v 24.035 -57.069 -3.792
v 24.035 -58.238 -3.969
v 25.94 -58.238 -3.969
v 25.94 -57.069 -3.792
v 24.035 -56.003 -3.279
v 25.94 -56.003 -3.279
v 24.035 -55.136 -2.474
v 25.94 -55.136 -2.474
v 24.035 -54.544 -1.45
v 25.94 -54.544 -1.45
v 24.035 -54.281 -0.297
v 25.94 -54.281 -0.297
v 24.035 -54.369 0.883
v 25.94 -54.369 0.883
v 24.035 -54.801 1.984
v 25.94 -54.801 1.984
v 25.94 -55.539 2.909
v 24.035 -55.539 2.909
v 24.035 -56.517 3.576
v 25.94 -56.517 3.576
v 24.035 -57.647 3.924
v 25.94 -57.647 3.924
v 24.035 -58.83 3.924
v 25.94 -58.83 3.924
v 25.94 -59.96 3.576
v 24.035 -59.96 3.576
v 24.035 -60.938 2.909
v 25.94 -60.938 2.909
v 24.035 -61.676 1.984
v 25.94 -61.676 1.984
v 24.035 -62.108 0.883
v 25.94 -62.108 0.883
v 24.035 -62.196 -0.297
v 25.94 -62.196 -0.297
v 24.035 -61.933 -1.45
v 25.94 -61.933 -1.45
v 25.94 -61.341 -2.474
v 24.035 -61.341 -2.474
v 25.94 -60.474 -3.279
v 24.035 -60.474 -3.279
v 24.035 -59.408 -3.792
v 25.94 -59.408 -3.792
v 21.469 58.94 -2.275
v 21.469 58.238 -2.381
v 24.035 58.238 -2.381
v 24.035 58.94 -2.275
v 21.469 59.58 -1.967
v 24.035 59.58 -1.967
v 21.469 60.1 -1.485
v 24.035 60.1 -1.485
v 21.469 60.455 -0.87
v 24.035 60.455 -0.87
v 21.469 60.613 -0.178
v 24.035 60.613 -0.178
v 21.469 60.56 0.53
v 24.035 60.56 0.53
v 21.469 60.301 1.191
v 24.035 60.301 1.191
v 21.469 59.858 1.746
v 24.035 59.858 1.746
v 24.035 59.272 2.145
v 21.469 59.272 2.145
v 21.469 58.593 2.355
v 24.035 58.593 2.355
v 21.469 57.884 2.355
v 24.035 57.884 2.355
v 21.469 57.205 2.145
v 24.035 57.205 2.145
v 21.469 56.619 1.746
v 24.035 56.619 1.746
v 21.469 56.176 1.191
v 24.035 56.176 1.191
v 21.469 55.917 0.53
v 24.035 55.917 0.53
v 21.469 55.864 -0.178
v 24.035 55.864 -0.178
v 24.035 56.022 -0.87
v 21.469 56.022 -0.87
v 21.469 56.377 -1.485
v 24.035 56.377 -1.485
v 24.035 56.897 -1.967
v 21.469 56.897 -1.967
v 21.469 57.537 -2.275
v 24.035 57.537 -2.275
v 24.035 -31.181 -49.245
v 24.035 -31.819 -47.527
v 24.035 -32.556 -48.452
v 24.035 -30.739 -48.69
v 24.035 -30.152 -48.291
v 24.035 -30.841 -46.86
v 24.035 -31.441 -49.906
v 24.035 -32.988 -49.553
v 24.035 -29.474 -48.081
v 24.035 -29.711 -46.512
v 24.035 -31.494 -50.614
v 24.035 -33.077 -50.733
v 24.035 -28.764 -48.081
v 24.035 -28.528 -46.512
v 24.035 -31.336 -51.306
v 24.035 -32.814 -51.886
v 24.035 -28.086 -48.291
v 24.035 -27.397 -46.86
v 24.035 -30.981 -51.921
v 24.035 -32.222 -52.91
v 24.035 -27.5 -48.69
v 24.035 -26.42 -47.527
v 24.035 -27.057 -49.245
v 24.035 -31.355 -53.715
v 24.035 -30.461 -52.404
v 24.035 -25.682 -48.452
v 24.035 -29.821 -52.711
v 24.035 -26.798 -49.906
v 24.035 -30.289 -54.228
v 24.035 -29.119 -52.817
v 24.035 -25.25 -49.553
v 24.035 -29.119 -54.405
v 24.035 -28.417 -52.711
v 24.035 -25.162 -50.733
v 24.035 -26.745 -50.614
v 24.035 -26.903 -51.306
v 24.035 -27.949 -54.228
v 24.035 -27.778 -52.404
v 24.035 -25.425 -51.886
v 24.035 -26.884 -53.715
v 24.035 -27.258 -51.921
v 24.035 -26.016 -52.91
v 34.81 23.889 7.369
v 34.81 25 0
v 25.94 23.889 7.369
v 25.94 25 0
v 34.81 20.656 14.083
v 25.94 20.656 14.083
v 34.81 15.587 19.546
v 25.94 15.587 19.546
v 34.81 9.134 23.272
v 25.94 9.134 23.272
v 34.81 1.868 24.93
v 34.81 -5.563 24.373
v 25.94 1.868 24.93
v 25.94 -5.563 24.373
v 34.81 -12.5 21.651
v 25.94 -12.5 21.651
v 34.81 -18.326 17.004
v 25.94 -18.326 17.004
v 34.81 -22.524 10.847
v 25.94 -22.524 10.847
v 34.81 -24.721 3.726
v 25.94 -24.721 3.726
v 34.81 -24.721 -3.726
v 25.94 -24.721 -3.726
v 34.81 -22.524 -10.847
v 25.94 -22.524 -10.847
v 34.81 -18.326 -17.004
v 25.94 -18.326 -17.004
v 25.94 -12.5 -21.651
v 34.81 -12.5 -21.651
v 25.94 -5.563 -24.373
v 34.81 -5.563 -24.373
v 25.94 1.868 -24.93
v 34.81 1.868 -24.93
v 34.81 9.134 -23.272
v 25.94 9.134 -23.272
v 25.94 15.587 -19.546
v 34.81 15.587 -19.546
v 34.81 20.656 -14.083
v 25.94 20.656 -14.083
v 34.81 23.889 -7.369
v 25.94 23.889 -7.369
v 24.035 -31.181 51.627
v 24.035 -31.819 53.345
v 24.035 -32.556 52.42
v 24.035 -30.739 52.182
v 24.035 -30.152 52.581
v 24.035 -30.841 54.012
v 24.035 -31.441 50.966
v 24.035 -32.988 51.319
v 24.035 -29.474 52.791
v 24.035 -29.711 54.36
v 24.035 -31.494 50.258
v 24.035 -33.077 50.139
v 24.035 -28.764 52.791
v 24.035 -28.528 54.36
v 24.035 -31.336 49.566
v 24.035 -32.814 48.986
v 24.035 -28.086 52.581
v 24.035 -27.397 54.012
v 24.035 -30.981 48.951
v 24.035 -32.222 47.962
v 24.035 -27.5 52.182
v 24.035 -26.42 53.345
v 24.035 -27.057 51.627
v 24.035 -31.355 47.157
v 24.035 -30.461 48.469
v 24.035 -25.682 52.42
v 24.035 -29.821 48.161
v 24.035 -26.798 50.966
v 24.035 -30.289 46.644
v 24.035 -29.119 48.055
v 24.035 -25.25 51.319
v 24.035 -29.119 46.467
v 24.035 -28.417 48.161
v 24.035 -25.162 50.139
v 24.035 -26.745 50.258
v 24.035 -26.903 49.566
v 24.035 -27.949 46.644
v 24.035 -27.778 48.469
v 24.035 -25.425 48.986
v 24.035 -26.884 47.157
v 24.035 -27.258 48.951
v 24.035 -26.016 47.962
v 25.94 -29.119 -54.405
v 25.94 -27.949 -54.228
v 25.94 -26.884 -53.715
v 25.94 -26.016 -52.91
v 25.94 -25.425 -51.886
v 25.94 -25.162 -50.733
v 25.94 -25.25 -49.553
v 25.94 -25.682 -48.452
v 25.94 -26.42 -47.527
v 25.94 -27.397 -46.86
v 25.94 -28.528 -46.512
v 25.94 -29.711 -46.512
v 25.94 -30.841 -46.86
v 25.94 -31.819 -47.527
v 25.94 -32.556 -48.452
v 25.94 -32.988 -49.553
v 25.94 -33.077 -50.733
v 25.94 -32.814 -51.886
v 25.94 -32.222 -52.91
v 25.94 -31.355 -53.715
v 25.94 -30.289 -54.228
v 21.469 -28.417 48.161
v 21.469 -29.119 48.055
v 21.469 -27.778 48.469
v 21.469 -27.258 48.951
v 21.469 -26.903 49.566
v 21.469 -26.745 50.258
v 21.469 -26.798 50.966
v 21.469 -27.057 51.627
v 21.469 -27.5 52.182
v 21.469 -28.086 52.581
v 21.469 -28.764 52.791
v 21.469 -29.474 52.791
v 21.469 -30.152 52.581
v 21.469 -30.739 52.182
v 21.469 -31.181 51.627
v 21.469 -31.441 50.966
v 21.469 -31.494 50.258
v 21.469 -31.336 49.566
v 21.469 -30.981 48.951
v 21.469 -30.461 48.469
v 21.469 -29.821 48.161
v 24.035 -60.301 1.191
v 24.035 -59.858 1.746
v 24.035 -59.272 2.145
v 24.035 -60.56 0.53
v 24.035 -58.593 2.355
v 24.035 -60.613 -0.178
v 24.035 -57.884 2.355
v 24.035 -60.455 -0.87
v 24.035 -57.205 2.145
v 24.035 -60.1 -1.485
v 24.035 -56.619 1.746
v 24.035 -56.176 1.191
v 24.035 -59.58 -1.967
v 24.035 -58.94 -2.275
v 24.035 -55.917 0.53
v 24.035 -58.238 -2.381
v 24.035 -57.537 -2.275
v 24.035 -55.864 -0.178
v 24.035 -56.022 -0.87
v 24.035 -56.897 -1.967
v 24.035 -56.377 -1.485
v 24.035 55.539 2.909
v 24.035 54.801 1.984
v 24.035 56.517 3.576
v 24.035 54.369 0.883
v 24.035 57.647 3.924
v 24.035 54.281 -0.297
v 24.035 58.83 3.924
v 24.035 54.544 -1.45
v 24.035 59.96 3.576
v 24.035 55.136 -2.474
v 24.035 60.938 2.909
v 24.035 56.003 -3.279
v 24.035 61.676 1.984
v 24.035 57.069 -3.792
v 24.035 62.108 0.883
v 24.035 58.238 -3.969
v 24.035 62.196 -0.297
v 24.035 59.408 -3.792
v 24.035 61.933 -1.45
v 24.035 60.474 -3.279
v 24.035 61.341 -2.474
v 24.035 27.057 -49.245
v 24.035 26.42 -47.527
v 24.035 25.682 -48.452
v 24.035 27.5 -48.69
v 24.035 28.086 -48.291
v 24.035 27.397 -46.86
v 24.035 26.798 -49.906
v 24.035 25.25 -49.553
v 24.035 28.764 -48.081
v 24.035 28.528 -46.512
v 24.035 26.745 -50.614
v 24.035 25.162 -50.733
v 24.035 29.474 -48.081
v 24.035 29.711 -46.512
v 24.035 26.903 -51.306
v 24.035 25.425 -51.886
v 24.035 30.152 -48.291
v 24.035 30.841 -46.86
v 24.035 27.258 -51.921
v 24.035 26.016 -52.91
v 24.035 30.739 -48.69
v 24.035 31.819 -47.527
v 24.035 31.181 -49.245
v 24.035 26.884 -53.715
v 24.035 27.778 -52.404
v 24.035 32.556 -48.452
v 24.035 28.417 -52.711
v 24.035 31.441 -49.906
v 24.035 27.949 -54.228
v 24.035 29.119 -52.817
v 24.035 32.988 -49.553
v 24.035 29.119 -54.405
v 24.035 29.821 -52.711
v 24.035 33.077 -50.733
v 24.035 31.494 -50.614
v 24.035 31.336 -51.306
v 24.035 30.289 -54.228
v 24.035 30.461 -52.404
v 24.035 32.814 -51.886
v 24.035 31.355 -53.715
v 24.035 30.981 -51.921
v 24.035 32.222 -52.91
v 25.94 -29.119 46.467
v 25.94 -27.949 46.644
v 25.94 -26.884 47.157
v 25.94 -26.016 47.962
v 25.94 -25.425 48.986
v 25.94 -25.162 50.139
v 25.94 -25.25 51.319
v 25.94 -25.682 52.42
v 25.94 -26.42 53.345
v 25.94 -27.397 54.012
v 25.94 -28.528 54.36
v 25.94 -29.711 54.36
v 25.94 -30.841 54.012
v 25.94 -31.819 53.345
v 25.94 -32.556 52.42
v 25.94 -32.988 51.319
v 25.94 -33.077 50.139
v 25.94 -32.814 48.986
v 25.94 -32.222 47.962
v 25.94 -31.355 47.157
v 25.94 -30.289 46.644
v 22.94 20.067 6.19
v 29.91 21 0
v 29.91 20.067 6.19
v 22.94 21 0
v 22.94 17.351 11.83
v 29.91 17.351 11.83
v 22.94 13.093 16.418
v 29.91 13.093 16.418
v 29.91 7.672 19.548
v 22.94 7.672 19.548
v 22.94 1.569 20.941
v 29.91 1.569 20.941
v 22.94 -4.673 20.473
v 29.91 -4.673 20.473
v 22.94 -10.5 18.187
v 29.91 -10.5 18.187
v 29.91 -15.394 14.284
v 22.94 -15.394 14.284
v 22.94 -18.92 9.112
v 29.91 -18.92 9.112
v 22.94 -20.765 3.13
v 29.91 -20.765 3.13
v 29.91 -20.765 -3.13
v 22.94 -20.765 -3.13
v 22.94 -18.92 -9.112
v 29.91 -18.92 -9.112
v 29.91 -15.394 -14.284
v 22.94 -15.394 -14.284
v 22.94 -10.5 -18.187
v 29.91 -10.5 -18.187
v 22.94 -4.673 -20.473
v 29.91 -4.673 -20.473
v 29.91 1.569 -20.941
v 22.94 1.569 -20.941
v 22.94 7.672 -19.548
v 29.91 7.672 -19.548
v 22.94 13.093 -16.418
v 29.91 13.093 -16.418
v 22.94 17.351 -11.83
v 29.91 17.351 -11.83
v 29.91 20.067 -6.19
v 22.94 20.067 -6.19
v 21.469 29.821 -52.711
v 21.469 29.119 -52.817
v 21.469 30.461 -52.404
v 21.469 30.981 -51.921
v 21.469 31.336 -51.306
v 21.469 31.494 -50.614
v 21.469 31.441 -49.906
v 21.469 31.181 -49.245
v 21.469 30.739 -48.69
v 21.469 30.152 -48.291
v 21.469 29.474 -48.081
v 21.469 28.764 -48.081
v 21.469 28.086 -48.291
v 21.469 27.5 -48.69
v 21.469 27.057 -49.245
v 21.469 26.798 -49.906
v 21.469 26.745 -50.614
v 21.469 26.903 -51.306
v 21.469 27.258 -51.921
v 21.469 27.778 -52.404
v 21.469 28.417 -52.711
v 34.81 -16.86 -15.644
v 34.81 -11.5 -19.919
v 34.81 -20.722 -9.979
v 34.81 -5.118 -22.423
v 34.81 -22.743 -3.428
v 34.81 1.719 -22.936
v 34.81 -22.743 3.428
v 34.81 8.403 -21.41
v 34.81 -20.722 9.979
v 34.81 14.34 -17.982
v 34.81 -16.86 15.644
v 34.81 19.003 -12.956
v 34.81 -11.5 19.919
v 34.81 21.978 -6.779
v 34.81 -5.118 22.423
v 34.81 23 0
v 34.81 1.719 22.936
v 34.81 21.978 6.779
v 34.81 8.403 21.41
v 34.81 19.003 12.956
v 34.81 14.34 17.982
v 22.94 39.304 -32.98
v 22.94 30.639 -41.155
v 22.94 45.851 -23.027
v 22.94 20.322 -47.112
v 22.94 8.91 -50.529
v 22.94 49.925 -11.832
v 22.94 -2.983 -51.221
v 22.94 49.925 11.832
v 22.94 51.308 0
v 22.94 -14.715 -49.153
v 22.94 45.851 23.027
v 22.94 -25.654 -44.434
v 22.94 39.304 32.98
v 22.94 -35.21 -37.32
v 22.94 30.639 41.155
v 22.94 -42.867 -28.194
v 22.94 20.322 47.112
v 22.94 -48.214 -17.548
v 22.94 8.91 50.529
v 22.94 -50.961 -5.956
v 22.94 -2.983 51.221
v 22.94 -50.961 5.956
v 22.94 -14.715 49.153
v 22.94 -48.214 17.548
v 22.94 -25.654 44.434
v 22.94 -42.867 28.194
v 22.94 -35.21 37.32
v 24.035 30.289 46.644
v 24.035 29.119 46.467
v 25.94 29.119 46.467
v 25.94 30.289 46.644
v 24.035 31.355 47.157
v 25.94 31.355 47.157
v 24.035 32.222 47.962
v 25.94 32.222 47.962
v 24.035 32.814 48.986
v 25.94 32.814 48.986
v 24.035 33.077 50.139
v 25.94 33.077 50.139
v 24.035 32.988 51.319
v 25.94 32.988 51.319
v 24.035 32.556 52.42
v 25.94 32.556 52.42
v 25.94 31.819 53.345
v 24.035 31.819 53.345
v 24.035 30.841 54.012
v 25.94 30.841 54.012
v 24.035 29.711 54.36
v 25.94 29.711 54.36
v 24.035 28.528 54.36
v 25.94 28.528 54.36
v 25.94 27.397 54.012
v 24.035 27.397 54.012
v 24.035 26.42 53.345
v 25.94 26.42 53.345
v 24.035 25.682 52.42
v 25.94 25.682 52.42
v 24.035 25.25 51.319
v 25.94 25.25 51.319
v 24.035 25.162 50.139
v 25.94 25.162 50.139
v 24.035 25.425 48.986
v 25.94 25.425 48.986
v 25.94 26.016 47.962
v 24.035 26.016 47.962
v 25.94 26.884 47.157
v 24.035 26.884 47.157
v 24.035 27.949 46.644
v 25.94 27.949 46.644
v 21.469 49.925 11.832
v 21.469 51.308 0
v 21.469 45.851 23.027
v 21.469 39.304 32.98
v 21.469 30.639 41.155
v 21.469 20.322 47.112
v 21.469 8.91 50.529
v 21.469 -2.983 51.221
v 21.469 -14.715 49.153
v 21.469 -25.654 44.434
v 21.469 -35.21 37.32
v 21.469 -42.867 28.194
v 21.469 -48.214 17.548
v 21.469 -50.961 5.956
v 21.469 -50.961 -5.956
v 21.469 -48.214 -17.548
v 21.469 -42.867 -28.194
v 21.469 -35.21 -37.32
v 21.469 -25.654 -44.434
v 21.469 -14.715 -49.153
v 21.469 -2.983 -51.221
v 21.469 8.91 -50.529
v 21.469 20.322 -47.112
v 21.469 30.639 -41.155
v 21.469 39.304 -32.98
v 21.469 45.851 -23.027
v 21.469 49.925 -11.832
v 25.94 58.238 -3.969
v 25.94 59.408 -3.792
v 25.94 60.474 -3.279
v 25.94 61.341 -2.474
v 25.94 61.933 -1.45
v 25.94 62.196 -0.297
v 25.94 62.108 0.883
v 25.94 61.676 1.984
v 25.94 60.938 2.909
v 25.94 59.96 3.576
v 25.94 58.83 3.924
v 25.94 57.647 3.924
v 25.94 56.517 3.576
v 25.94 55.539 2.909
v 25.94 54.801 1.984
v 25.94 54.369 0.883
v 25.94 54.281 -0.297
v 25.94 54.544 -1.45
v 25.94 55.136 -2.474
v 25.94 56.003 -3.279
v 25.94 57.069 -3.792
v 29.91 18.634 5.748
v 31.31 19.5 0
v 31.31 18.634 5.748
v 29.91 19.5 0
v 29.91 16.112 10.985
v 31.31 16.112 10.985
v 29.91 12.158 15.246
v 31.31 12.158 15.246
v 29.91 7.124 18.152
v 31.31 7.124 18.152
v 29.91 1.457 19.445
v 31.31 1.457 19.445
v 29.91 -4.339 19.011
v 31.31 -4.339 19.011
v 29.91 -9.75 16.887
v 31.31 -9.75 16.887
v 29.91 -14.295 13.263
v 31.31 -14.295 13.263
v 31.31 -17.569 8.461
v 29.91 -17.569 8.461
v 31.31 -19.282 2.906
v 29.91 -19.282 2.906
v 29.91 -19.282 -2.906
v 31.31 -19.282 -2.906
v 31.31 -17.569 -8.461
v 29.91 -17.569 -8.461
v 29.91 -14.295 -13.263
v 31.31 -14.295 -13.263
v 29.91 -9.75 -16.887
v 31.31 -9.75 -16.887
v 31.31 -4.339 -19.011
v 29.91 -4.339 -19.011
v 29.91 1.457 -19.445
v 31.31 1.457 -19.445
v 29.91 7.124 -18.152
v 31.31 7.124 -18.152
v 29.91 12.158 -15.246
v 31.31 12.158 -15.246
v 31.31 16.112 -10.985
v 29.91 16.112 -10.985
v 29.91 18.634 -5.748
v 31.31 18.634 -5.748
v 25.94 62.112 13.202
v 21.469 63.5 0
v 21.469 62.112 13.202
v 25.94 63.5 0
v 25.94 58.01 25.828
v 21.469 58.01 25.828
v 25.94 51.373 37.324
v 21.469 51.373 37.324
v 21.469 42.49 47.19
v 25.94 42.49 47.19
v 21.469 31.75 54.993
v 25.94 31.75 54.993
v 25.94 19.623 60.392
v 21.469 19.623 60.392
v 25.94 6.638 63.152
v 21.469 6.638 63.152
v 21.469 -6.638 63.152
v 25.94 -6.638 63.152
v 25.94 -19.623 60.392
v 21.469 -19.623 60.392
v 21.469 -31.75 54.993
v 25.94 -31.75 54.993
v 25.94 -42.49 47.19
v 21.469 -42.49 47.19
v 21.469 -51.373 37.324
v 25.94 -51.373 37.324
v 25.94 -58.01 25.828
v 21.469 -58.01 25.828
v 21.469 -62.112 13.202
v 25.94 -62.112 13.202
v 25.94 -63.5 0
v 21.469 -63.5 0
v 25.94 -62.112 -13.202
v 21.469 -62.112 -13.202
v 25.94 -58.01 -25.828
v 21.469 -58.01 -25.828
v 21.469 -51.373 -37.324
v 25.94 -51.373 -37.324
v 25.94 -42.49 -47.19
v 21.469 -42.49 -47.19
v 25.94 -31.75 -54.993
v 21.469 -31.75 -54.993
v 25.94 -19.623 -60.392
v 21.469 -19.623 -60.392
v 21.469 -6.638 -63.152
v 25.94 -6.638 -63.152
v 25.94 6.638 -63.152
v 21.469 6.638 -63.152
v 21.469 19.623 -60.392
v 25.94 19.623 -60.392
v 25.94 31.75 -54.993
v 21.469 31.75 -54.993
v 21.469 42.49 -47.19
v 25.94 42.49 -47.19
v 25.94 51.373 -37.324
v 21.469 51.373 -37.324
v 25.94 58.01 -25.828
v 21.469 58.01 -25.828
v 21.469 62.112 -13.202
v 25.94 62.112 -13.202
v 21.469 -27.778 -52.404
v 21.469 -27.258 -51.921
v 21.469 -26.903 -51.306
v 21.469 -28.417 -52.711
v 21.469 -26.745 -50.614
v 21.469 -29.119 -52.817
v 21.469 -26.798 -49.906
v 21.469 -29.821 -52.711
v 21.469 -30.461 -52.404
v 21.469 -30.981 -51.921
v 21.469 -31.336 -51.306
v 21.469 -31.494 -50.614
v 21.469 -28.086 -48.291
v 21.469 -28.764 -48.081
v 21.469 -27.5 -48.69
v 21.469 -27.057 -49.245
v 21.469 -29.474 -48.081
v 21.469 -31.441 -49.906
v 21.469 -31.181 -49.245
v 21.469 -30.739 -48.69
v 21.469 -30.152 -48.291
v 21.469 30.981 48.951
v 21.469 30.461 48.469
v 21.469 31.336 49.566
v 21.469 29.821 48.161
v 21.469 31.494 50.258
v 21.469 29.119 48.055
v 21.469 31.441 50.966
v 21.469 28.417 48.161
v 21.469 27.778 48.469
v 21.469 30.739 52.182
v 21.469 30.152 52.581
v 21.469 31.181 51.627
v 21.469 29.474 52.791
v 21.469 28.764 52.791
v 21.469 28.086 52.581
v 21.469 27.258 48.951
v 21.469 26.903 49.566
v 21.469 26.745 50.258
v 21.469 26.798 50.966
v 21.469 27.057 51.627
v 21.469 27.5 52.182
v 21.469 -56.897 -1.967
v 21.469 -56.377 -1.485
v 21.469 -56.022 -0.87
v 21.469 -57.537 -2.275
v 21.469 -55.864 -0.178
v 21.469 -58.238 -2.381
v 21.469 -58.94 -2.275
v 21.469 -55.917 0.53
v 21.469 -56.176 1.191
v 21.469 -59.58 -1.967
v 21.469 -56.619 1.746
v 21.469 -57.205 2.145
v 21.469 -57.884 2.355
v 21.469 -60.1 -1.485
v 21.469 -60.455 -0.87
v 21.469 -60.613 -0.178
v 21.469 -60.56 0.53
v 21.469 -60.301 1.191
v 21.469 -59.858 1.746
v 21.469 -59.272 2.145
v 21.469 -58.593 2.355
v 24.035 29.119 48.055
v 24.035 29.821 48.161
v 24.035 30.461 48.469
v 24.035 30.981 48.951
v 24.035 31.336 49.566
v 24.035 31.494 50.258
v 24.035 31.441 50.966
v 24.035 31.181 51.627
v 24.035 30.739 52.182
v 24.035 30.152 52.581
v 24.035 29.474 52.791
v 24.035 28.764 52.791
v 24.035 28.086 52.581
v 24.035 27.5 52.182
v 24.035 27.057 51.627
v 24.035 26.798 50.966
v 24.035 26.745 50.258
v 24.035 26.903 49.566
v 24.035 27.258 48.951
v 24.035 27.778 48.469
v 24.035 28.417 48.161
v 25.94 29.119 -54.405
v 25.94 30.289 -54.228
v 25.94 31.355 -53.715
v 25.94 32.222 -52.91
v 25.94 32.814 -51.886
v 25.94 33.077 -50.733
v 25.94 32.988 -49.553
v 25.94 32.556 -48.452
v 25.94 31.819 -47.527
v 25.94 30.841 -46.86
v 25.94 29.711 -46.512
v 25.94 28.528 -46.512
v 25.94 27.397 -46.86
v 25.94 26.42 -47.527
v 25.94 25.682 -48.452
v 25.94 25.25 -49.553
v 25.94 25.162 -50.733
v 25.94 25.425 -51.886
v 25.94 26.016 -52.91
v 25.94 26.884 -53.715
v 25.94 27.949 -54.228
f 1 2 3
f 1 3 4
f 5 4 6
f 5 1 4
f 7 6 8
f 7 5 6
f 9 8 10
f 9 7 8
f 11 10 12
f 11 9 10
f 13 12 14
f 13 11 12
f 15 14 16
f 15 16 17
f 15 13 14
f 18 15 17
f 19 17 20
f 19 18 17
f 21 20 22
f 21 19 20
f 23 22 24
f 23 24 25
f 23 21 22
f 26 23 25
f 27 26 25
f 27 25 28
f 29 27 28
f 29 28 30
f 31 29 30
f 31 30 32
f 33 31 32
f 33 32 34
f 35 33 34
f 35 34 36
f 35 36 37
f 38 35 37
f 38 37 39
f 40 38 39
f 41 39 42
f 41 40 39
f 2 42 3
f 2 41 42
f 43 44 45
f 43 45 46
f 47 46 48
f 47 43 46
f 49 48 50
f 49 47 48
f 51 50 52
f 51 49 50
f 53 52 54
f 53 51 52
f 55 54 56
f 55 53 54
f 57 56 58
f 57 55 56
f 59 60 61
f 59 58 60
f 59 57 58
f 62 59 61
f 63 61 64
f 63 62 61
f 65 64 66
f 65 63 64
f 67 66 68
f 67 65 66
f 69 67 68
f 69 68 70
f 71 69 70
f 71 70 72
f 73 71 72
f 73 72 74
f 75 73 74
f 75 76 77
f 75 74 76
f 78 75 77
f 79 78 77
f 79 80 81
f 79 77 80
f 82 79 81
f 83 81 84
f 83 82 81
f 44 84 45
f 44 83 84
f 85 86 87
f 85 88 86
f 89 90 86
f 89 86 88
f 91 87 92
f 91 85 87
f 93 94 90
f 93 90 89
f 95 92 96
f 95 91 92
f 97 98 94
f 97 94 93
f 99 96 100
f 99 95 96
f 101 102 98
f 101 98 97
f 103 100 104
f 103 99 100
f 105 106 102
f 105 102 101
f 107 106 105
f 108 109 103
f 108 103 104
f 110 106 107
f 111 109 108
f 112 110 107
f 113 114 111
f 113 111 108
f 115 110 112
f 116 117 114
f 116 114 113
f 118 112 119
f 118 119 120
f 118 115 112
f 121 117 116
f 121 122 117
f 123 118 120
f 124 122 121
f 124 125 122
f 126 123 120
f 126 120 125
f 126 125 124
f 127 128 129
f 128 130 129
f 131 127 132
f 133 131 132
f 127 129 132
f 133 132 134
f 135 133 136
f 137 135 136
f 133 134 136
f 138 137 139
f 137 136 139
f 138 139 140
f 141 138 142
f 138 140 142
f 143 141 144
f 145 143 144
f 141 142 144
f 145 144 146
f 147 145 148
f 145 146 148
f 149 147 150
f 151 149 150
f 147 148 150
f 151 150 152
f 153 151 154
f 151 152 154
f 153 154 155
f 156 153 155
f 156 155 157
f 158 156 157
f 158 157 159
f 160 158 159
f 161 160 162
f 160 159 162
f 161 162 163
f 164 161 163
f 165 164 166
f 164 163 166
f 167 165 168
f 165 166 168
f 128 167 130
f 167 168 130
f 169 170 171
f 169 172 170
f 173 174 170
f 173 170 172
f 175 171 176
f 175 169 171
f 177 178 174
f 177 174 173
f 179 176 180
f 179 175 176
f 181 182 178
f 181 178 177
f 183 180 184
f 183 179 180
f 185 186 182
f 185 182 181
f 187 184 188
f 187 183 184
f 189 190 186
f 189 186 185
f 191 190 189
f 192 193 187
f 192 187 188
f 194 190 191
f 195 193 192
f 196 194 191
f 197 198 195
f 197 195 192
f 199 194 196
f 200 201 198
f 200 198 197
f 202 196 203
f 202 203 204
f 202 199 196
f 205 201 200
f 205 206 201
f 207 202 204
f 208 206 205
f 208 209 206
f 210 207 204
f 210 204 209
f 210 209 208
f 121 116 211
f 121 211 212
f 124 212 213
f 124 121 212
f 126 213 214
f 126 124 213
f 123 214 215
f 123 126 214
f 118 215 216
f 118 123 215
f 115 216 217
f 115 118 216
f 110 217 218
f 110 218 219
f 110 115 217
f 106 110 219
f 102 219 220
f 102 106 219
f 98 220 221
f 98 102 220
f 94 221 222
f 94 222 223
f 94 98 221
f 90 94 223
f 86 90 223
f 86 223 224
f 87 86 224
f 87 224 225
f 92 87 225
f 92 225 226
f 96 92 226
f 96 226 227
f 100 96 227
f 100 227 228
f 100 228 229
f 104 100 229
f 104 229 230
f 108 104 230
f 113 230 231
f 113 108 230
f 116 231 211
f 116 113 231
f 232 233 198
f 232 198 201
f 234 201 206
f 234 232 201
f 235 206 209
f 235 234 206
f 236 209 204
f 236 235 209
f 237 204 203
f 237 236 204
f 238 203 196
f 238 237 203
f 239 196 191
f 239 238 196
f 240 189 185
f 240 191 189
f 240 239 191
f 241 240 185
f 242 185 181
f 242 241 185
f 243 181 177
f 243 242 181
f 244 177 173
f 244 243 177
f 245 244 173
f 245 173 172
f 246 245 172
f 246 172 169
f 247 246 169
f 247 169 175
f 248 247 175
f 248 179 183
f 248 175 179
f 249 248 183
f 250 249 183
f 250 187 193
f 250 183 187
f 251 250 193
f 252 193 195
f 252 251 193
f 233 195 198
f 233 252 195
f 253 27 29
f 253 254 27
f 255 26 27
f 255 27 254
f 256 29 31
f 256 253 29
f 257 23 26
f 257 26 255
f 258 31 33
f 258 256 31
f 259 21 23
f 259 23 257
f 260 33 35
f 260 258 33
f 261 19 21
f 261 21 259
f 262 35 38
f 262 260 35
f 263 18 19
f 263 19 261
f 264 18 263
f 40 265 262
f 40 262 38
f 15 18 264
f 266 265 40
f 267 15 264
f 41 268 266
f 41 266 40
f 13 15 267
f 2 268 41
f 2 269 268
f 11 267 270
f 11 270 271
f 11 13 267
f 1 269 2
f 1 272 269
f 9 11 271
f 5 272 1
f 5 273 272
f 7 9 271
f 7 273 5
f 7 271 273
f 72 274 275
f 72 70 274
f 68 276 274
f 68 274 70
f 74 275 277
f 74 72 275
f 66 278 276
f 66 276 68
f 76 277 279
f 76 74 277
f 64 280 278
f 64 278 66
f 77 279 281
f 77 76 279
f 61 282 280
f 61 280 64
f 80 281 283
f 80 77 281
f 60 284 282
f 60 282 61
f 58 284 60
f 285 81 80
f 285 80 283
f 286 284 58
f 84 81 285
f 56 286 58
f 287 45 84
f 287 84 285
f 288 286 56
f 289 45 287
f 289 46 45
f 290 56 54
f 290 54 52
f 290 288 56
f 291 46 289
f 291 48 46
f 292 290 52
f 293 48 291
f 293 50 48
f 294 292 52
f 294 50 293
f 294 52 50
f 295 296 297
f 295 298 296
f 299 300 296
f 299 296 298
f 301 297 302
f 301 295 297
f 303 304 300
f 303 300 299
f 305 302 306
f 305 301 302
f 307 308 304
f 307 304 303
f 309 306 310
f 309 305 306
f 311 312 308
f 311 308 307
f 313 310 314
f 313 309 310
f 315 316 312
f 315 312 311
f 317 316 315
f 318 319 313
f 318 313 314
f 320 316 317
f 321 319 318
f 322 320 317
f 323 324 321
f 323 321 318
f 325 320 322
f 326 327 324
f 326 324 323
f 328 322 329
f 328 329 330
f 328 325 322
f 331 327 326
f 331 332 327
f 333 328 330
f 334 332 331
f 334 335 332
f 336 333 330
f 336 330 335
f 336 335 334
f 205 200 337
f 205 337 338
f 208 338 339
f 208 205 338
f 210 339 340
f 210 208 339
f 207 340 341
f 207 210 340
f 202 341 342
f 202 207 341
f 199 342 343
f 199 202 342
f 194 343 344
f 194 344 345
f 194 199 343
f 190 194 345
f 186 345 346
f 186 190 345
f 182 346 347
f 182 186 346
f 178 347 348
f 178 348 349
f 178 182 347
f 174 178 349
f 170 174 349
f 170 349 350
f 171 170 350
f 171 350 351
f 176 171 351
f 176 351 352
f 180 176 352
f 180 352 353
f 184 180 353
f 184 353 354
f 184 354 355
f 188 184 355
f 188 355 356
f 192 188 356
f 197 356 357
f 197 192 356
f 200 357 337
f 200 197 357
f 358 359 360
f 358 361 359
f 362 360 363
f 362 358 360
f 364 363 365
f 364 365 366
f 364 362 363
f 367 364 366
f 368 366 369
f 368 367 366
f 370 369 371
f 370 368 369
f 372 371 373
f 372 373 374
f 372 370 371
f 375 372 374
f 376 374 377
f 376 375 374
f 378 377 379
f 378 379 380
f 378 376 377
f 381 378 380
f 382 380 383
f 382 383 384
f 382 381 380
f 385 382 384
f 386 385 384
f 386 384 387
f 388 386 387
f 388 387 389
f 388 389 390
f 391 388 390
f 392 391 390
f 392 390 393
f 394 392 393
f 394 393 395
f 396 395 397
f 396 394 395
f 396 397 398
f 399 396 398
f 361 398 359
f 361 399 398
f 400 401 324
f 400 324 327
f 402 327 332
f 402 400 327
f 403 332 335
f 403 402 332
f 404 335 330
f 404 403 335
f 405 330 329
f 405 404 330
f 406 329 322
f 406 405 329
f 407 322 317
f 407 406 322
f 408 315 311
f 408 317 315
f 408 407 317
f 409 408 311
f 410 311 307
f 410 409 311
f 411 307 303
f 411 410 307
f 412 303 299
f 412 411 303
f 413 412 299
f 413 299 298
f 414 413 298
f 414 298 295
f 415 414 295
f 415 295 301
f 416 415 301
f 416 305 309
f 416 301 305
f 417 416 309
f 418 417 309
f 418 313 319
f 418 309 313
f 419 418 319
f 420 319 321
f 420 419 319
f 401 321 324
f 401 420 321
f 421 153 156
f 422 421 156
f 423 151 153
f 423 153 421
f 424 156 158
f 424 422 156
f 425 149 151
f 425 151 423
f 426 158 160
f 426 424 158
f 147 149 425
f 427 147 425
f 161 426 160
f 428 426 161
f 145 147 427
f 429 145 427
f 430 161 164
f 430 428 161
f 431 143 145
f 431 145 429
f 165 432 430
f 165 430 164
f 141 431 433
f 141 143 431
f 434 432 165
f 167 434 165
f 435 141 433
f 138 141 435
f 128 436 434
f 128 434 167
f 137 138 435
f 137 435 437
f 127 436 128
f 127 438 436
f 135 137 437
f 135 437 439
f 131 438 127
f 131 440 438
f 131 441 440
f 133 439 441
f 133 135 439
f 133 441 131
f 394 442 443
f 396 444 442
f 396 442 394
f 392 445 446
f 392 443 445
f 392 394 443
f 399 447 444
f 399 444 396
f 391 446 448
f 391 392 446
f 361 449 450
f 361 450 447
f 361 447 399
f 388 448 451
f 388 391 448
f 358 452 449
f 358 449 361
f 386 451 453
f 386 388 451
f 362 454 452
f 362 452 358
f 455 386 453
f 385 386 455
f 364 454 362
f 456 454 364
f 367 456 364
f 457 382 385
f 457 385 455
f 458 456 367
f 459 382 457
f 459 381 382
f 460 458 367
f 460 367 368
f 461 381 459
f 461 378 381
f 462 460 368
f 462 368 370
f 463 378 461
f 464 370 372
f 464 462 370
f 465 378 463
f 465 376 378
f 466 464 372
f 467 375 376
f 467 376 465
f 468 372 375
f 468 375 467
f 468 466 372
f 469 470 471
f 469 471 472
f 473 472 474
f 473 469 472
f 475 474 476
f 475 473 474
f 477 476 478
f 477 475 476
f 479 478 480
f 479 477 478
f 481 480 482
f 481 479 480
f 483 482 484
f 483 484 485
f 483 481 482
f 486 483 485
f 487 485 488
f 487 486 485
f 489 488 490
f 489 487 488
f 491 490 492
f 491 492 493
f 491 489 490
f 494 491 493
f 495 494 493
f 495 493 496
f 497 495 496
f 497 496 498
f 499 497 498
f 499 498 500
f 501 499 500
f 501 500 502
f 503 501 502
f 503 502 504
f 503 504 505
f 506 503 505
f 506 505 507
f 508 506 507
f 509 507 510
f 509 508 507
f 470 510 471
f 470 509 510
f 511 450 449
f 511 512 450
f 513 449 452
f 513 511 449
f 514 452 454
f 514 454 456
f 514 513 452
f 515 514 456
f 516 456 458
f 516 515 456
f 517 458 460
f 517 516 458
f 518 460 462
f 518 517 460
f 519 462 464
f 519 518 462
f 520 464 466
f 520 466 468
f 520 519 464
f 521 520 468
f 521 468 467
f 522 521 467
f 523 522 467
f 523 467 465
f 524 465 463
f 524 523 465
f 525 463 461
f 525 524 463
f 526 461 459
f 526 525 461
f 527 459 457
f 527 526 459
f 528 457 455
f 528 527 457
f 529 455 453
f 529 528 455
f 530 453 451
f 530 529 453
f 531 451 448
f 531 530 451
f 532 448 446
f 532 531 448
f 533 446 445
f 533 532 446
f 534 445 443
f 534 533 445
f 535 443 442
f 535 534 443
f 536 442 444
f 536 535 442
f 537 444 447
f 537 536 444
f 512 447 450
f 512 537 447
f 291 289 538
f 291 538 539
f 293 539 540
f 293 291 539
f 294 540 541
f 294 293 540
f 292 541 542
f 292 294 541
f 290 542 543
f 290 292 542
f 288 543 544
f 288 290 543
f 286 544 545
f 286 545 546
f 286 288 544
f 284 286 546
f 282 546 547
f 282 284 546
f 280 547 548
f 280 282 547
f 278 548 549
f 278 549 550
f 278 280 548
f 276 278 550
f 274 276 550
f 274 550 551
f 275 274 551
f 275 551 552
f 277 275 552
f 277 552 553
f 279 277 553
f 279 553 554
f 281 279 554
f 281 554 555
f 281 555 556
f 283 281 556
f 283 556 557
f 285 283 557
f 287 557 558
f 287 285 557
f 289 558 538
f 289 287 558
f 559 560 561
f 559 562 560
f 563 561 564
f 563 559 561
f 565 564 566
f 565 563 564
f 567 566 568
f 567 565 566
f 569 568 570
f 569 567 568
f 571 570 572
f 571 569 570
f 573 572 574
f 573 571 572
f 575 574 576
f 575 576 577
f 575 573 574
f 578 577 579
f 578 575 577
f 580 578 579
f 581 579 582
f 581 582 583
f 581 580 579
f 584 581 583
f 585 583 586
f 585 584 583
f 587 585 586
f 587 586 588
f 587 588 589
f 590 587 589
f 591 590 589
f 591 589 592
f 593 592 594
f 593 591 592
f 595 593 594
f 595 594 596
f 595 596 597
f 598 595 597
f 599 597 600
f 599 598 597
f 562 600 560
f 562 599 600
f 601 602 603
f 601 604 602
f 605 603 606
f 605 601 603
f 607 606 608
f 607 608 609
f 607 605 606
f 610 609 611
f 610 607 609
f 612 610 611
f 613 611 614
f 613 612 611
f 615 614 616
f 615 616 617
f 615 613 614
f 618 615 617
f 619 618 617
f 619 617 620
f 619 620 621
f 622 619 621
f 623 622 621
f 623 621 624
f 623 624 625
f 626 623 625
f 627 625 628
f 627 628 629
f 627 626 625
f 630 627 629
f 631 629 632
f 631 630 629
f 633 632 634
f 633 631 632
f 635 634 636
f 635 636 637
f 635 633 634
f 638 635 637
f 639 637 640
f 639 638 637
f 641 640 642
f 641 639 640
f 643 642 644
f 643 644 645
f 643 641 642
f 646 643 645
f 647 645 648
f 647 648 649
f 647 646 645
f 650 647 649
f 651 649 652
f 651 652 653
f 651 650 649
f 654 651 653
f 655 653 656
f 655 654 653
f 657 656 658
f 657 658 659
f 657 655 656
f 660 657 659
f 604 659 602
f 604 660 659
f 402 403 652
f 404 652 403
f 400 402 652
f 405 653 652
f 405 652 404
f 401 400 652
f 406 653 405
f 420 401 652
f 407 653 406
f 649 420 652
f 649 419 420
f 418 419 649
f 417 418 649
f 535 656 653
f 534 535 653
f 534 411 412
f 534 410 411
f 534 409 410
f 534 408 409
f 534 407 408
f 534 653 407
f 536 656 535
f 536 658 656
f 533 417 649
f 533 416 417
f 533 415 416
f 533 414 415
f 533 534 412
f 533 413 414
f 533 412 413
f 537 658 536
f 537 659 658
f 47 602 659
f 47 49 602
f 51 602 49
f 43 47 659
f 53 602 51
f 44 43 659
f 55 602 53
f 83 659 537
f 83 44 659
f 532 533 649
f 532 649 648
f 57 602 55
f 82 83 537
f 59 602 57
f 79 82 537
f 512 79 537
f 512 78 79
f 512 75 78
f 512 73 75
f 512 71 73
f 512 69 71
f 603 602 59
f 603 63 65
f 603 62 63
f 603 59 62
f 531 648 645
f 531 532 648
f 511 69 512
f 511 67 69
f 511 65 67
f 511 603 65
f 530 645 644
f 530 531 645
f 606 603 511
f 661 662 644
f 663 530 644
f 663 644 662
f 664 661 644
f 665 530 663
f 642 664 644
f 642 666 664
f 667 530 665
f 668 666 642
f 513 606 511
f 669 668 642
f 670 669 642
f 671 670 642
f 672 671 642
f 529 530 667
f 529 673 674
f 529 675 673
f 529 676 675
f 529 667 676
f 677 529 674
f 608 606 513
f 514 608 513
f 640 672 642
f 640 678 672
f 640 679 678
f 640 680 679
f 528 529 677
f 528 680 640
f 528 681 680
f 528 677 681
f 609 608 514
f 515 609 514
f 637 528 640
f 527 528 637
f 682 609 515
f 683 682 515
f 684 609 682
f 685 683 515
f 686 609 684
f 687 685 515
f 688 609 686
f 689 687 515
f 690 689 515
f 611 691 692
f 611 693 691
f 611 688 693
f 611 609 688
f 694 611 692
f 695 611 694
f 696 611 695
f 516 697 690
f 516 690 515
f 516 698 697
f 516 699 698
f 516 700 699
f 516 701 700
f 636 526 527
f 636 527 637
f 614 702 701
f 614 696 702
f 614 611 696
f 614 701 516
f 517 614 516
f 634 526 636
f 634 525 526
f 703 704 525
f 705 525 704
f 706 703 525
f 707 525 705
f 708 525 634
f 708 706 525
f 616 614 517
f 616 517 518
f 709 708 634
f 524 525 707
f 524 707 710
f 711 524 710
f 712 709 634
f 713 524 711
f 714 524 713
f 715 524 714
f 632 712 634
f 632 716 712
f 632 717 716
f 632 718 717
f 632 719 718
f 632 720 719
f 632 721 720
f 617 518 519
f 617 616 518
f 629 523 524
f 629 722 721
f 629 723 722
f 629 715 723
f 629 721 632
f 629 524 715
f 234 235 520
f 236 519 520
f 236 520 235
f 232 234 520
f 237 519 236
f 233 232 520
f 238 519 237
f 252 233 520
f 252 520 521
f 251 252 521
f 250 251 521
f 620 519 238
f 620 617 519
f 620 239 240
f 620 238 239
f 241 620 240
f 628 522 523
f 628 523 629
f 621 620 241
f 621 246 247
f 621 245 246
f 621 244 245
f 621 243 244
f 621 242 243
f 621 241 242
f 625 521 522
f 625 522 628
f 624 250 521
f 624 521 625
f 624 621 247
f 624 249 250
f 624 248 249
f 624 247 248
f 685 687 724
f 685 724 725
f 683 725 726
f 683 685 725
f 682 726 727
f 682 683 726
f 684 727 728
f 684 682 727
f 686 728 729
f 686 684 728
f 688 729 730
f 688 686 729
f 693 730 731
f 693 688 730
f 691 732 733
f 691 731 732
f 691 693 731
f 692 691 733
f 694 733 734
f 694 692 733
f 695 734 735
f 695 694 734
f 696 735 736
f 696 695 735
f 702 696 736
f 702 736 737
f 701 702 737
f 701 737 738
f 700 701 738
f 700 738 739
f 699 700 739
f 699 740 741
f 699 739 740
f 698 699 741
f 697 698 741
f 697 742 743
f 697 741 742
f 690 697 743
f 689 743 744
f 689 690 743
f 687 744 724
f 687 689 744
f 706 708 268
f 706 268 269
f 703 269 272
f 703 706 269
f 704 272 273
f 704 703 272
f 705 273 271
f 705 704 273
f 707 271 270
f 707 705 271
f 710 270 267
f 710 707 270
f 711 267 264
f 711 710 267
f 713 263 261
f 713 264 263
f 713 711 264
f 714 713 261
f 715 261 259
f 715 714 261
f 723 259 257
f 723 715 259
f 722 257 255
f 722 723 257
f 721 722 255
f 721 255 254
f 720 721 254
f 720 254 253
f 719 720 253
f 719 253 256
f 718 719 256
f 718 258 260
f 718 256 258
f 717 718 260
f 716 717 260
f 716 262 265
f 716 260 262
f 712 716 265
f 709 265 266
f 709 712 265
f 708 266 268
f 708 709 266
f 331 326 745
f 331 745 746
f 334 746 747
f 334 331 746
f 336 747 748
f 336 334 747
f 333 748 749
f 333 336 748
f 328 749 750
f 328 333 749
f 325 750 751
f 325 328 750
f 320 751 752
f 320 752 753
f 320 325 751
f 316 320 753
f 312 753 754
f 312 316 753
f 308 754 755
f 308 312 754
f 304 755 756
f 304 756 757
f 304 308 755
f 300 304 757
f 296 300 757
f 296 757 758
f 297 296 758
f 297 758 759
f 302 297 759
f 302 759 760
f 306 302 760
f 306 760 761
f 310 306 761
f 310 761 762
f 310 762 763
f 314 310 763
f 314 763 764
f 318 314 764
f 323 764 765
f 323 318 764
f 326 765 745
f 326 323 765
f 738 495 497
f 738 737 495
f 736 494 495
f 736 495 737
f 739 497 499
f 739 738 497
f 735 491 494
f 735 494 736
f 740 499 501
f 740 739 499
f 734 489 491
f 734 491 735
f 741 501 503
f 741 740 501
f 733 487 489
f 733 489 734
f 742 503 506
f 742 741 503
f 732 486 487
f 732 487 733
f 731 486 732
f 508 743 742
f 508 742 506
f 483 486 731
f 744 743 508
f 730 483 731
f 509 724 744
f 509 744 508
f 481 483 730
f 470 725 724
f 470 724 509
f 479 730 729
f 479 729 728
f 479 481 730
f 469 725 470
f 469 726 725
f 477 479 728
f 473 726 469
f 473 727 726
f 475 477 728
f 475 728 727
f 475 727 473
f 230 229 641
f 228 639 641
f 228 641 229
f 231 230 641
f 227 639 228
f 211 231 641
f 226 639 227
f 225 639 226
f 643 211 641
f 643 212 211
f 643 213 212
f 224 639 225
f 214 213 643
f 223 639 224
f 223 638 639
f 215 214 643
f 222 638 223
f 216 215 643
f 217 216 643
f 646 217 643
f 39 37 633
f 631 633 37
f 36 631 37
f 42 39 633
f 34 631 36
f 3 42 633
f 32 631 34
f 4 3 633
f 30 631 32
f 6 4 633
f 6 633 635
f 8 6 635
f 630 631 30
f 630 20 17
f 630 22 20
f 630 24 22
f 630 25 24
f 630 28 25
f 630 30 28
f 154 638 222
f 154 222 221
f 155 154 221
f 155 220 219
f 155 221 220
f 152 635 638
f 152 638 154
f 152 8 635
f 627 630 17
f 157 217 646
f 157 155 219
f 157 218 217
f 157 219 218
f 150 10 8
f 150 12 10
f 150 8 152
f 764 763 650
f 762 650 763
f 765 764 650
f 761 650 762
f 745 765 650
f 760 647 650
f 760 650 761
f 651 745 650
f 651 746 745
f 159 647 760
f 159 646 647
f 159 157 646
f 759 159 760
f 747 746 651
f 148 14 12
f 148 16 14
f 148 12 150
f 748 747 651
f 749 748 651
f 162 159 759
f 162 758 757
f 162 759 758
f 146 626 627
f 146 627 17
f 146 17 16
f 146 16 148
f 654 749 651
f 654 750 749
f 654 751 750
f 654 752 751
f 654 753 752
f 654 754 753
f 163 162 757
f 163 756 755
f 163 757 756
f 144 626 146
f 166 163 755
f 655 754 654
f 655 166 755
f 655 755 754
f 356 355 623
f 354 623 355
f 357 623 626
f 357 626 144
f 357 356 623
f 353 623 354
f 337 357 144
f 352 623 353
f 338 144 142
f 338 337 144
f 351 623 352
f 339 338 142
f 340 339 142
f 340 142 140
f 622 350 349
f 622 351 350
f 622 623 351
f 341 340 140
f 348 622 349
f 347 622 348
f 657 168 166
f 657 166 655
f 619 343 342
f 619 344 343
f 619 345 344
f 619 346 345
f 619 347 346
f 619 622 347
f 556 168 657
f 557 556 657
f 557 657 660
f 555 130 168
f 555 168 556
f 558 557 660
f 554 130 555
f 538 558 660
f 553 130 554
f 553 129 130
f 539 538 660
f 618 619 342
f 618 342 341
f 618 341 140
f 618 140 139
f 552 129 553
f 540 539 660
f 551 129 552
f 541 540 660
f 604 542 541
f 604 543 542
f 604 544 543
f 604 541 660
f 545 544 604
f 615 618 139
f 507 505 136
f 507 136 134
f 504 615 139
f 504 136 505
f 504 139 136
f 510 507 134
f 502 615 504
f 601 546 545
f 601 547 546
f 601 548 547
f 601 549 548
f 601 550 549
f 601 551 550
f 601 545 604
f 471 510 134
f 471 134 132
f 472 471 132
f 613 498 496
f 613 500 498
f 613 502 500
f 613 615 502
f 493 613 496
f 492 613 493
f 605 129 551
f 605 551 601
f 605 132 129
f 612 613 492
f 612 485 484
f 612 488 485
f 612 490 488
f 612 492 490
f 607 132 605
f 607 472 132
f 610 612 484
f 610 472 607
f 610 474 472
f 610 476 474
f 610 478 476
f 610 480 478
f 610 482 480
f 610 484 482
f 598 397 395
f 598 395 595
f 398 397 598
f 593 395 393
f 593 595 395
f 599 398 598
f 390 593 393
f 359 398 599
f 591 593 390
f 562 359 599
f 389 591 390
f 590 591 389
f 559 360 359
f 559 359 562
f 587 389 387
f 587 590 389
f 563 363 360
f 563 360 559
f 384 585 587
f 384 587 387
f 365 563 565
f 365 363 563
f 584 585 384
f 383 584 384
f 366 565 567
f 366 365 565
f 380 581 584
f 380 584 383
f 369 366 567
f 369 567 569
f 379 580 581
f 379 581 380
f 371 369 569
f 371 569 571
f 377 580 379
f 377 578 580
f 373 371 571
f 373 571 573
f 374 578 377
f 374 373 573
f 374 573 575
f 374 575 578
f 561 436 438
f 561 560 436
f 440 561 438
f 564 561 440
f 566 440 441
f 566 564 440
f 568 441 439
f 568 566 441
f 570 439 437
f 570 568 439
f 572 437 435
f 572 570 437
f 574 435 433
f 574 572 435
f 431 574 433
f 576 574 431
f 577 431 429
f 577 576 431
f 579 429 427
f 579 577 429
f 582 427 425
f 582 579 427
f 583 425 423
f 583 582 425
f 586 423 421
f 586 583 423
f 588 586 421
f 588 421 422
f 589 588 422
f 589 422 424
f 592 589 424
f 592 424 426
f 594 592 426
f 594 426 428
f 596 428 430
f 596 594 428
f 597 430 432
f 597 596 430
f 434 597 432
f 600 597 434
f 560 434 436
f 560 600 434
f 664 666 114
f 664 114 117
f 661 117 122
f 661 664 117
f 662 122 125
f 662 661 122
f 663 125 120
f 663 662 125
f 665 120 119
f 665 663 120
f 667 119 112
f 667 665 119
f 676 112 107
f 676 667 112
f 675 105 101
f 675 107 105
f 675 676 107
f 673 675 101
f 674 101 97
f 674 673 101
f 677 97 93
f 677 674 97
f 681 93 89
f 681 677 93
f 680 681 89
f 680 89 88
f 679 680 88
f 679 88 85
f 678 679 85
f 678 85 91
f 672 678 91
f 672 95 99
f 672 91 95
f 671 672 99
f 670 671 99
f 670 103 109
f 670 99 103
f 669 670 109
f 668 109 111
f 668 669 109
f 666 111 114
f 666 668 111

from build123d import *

# Parameters (mm, degrees)
CUT_EXTRUDE1_START = 24.0348
SKETCH7_R          = 3.96875
CUT_EXTRUDE1_DEPTH = 1.905
SKETCH8_R          = 2.38125
CUT_EXTRUDE2_DEPTH = 35.809800078


with BuildPart() as part:
    # Sketch3 → Revolve1 (revolve)
    with BuildSketch(Plane.XY):
        Polygon((34.809800078, 25.000000038), (34.809800078, 22.999999974), (31.309800093, 19.499999989), (29.909799972, 19.499999989), (29.909799972, 21.000000037), (22.939799942, 21.000000037), (22.939799942, 51.308), (21.469400038, 51.308), (21.469400038, 63.5), (25.939800038, 63.5), (25.939800038, 25.000000038), (27.839800048, 25.000000038), align=None)
    revolve(axis=Axis((0, 0, 0), (1, 0, 0)))

    # Sketch7 → Cut-Extrude1 (cut)
    with BuildSketch(Plane(origin=(0, 0, 0), x_dir=(0, 0, -1), z_dir=(1, 0, 0)).offset(CUT_EXTRUDE1_START)):
        with Locations((50.436020463, -29.119249991)):
            Circle(SKETCH7_R)
        with Locations((0, -58.238499982)):
            Circle(SKETCH7_R)
        with Locations((-50.436020463, -29.119249991)):
            Circle(SKETCH7_R)
        with Locations((-50.436020463, 29.119249991)):
            Circle(SKETCH7_R)
        with Locations((50.436020463, 29.119249991)):
            Circle(SKETCH7_R)
        with Locations((0, 58.238499982)):
            Circle(SKETCH7_R)
    extrude(amount=CUT_EXTRUDE1_DEPTH, mode=Mode.SUBTRACT)

    # Sketch8 → Cut-Extrude2 (cut, through all)
    with BuildSketch(Plane(origin=(0, 0, 0), x_dir=(0, 0, -1), z_dir=(1, 0, 0))):
        with Locations((50.436020463, 29.119249991)):
            Circle(SKETCH8_R)
        with Locations((50.436020463, -29.119249991)):
            Circle(SKETCH8_R)
        with Locations((0, -58.238499982)):
            Circle(SKETCH8_R)
        with Locations((-50.436020463, -29.119249991)):
            Circle(SKETCH8_R)
        with Locations((-50.436020463, 29.119249991)):
            Circle(SKETCH8_R)
        with Locations((0, 58.238499982)):
            Circle(SKETCH8_R)
    extrude(amount=CUT_EXTRUDE2_DEPTH, mode=Mode.SUBTRACT)


solid = part.part
